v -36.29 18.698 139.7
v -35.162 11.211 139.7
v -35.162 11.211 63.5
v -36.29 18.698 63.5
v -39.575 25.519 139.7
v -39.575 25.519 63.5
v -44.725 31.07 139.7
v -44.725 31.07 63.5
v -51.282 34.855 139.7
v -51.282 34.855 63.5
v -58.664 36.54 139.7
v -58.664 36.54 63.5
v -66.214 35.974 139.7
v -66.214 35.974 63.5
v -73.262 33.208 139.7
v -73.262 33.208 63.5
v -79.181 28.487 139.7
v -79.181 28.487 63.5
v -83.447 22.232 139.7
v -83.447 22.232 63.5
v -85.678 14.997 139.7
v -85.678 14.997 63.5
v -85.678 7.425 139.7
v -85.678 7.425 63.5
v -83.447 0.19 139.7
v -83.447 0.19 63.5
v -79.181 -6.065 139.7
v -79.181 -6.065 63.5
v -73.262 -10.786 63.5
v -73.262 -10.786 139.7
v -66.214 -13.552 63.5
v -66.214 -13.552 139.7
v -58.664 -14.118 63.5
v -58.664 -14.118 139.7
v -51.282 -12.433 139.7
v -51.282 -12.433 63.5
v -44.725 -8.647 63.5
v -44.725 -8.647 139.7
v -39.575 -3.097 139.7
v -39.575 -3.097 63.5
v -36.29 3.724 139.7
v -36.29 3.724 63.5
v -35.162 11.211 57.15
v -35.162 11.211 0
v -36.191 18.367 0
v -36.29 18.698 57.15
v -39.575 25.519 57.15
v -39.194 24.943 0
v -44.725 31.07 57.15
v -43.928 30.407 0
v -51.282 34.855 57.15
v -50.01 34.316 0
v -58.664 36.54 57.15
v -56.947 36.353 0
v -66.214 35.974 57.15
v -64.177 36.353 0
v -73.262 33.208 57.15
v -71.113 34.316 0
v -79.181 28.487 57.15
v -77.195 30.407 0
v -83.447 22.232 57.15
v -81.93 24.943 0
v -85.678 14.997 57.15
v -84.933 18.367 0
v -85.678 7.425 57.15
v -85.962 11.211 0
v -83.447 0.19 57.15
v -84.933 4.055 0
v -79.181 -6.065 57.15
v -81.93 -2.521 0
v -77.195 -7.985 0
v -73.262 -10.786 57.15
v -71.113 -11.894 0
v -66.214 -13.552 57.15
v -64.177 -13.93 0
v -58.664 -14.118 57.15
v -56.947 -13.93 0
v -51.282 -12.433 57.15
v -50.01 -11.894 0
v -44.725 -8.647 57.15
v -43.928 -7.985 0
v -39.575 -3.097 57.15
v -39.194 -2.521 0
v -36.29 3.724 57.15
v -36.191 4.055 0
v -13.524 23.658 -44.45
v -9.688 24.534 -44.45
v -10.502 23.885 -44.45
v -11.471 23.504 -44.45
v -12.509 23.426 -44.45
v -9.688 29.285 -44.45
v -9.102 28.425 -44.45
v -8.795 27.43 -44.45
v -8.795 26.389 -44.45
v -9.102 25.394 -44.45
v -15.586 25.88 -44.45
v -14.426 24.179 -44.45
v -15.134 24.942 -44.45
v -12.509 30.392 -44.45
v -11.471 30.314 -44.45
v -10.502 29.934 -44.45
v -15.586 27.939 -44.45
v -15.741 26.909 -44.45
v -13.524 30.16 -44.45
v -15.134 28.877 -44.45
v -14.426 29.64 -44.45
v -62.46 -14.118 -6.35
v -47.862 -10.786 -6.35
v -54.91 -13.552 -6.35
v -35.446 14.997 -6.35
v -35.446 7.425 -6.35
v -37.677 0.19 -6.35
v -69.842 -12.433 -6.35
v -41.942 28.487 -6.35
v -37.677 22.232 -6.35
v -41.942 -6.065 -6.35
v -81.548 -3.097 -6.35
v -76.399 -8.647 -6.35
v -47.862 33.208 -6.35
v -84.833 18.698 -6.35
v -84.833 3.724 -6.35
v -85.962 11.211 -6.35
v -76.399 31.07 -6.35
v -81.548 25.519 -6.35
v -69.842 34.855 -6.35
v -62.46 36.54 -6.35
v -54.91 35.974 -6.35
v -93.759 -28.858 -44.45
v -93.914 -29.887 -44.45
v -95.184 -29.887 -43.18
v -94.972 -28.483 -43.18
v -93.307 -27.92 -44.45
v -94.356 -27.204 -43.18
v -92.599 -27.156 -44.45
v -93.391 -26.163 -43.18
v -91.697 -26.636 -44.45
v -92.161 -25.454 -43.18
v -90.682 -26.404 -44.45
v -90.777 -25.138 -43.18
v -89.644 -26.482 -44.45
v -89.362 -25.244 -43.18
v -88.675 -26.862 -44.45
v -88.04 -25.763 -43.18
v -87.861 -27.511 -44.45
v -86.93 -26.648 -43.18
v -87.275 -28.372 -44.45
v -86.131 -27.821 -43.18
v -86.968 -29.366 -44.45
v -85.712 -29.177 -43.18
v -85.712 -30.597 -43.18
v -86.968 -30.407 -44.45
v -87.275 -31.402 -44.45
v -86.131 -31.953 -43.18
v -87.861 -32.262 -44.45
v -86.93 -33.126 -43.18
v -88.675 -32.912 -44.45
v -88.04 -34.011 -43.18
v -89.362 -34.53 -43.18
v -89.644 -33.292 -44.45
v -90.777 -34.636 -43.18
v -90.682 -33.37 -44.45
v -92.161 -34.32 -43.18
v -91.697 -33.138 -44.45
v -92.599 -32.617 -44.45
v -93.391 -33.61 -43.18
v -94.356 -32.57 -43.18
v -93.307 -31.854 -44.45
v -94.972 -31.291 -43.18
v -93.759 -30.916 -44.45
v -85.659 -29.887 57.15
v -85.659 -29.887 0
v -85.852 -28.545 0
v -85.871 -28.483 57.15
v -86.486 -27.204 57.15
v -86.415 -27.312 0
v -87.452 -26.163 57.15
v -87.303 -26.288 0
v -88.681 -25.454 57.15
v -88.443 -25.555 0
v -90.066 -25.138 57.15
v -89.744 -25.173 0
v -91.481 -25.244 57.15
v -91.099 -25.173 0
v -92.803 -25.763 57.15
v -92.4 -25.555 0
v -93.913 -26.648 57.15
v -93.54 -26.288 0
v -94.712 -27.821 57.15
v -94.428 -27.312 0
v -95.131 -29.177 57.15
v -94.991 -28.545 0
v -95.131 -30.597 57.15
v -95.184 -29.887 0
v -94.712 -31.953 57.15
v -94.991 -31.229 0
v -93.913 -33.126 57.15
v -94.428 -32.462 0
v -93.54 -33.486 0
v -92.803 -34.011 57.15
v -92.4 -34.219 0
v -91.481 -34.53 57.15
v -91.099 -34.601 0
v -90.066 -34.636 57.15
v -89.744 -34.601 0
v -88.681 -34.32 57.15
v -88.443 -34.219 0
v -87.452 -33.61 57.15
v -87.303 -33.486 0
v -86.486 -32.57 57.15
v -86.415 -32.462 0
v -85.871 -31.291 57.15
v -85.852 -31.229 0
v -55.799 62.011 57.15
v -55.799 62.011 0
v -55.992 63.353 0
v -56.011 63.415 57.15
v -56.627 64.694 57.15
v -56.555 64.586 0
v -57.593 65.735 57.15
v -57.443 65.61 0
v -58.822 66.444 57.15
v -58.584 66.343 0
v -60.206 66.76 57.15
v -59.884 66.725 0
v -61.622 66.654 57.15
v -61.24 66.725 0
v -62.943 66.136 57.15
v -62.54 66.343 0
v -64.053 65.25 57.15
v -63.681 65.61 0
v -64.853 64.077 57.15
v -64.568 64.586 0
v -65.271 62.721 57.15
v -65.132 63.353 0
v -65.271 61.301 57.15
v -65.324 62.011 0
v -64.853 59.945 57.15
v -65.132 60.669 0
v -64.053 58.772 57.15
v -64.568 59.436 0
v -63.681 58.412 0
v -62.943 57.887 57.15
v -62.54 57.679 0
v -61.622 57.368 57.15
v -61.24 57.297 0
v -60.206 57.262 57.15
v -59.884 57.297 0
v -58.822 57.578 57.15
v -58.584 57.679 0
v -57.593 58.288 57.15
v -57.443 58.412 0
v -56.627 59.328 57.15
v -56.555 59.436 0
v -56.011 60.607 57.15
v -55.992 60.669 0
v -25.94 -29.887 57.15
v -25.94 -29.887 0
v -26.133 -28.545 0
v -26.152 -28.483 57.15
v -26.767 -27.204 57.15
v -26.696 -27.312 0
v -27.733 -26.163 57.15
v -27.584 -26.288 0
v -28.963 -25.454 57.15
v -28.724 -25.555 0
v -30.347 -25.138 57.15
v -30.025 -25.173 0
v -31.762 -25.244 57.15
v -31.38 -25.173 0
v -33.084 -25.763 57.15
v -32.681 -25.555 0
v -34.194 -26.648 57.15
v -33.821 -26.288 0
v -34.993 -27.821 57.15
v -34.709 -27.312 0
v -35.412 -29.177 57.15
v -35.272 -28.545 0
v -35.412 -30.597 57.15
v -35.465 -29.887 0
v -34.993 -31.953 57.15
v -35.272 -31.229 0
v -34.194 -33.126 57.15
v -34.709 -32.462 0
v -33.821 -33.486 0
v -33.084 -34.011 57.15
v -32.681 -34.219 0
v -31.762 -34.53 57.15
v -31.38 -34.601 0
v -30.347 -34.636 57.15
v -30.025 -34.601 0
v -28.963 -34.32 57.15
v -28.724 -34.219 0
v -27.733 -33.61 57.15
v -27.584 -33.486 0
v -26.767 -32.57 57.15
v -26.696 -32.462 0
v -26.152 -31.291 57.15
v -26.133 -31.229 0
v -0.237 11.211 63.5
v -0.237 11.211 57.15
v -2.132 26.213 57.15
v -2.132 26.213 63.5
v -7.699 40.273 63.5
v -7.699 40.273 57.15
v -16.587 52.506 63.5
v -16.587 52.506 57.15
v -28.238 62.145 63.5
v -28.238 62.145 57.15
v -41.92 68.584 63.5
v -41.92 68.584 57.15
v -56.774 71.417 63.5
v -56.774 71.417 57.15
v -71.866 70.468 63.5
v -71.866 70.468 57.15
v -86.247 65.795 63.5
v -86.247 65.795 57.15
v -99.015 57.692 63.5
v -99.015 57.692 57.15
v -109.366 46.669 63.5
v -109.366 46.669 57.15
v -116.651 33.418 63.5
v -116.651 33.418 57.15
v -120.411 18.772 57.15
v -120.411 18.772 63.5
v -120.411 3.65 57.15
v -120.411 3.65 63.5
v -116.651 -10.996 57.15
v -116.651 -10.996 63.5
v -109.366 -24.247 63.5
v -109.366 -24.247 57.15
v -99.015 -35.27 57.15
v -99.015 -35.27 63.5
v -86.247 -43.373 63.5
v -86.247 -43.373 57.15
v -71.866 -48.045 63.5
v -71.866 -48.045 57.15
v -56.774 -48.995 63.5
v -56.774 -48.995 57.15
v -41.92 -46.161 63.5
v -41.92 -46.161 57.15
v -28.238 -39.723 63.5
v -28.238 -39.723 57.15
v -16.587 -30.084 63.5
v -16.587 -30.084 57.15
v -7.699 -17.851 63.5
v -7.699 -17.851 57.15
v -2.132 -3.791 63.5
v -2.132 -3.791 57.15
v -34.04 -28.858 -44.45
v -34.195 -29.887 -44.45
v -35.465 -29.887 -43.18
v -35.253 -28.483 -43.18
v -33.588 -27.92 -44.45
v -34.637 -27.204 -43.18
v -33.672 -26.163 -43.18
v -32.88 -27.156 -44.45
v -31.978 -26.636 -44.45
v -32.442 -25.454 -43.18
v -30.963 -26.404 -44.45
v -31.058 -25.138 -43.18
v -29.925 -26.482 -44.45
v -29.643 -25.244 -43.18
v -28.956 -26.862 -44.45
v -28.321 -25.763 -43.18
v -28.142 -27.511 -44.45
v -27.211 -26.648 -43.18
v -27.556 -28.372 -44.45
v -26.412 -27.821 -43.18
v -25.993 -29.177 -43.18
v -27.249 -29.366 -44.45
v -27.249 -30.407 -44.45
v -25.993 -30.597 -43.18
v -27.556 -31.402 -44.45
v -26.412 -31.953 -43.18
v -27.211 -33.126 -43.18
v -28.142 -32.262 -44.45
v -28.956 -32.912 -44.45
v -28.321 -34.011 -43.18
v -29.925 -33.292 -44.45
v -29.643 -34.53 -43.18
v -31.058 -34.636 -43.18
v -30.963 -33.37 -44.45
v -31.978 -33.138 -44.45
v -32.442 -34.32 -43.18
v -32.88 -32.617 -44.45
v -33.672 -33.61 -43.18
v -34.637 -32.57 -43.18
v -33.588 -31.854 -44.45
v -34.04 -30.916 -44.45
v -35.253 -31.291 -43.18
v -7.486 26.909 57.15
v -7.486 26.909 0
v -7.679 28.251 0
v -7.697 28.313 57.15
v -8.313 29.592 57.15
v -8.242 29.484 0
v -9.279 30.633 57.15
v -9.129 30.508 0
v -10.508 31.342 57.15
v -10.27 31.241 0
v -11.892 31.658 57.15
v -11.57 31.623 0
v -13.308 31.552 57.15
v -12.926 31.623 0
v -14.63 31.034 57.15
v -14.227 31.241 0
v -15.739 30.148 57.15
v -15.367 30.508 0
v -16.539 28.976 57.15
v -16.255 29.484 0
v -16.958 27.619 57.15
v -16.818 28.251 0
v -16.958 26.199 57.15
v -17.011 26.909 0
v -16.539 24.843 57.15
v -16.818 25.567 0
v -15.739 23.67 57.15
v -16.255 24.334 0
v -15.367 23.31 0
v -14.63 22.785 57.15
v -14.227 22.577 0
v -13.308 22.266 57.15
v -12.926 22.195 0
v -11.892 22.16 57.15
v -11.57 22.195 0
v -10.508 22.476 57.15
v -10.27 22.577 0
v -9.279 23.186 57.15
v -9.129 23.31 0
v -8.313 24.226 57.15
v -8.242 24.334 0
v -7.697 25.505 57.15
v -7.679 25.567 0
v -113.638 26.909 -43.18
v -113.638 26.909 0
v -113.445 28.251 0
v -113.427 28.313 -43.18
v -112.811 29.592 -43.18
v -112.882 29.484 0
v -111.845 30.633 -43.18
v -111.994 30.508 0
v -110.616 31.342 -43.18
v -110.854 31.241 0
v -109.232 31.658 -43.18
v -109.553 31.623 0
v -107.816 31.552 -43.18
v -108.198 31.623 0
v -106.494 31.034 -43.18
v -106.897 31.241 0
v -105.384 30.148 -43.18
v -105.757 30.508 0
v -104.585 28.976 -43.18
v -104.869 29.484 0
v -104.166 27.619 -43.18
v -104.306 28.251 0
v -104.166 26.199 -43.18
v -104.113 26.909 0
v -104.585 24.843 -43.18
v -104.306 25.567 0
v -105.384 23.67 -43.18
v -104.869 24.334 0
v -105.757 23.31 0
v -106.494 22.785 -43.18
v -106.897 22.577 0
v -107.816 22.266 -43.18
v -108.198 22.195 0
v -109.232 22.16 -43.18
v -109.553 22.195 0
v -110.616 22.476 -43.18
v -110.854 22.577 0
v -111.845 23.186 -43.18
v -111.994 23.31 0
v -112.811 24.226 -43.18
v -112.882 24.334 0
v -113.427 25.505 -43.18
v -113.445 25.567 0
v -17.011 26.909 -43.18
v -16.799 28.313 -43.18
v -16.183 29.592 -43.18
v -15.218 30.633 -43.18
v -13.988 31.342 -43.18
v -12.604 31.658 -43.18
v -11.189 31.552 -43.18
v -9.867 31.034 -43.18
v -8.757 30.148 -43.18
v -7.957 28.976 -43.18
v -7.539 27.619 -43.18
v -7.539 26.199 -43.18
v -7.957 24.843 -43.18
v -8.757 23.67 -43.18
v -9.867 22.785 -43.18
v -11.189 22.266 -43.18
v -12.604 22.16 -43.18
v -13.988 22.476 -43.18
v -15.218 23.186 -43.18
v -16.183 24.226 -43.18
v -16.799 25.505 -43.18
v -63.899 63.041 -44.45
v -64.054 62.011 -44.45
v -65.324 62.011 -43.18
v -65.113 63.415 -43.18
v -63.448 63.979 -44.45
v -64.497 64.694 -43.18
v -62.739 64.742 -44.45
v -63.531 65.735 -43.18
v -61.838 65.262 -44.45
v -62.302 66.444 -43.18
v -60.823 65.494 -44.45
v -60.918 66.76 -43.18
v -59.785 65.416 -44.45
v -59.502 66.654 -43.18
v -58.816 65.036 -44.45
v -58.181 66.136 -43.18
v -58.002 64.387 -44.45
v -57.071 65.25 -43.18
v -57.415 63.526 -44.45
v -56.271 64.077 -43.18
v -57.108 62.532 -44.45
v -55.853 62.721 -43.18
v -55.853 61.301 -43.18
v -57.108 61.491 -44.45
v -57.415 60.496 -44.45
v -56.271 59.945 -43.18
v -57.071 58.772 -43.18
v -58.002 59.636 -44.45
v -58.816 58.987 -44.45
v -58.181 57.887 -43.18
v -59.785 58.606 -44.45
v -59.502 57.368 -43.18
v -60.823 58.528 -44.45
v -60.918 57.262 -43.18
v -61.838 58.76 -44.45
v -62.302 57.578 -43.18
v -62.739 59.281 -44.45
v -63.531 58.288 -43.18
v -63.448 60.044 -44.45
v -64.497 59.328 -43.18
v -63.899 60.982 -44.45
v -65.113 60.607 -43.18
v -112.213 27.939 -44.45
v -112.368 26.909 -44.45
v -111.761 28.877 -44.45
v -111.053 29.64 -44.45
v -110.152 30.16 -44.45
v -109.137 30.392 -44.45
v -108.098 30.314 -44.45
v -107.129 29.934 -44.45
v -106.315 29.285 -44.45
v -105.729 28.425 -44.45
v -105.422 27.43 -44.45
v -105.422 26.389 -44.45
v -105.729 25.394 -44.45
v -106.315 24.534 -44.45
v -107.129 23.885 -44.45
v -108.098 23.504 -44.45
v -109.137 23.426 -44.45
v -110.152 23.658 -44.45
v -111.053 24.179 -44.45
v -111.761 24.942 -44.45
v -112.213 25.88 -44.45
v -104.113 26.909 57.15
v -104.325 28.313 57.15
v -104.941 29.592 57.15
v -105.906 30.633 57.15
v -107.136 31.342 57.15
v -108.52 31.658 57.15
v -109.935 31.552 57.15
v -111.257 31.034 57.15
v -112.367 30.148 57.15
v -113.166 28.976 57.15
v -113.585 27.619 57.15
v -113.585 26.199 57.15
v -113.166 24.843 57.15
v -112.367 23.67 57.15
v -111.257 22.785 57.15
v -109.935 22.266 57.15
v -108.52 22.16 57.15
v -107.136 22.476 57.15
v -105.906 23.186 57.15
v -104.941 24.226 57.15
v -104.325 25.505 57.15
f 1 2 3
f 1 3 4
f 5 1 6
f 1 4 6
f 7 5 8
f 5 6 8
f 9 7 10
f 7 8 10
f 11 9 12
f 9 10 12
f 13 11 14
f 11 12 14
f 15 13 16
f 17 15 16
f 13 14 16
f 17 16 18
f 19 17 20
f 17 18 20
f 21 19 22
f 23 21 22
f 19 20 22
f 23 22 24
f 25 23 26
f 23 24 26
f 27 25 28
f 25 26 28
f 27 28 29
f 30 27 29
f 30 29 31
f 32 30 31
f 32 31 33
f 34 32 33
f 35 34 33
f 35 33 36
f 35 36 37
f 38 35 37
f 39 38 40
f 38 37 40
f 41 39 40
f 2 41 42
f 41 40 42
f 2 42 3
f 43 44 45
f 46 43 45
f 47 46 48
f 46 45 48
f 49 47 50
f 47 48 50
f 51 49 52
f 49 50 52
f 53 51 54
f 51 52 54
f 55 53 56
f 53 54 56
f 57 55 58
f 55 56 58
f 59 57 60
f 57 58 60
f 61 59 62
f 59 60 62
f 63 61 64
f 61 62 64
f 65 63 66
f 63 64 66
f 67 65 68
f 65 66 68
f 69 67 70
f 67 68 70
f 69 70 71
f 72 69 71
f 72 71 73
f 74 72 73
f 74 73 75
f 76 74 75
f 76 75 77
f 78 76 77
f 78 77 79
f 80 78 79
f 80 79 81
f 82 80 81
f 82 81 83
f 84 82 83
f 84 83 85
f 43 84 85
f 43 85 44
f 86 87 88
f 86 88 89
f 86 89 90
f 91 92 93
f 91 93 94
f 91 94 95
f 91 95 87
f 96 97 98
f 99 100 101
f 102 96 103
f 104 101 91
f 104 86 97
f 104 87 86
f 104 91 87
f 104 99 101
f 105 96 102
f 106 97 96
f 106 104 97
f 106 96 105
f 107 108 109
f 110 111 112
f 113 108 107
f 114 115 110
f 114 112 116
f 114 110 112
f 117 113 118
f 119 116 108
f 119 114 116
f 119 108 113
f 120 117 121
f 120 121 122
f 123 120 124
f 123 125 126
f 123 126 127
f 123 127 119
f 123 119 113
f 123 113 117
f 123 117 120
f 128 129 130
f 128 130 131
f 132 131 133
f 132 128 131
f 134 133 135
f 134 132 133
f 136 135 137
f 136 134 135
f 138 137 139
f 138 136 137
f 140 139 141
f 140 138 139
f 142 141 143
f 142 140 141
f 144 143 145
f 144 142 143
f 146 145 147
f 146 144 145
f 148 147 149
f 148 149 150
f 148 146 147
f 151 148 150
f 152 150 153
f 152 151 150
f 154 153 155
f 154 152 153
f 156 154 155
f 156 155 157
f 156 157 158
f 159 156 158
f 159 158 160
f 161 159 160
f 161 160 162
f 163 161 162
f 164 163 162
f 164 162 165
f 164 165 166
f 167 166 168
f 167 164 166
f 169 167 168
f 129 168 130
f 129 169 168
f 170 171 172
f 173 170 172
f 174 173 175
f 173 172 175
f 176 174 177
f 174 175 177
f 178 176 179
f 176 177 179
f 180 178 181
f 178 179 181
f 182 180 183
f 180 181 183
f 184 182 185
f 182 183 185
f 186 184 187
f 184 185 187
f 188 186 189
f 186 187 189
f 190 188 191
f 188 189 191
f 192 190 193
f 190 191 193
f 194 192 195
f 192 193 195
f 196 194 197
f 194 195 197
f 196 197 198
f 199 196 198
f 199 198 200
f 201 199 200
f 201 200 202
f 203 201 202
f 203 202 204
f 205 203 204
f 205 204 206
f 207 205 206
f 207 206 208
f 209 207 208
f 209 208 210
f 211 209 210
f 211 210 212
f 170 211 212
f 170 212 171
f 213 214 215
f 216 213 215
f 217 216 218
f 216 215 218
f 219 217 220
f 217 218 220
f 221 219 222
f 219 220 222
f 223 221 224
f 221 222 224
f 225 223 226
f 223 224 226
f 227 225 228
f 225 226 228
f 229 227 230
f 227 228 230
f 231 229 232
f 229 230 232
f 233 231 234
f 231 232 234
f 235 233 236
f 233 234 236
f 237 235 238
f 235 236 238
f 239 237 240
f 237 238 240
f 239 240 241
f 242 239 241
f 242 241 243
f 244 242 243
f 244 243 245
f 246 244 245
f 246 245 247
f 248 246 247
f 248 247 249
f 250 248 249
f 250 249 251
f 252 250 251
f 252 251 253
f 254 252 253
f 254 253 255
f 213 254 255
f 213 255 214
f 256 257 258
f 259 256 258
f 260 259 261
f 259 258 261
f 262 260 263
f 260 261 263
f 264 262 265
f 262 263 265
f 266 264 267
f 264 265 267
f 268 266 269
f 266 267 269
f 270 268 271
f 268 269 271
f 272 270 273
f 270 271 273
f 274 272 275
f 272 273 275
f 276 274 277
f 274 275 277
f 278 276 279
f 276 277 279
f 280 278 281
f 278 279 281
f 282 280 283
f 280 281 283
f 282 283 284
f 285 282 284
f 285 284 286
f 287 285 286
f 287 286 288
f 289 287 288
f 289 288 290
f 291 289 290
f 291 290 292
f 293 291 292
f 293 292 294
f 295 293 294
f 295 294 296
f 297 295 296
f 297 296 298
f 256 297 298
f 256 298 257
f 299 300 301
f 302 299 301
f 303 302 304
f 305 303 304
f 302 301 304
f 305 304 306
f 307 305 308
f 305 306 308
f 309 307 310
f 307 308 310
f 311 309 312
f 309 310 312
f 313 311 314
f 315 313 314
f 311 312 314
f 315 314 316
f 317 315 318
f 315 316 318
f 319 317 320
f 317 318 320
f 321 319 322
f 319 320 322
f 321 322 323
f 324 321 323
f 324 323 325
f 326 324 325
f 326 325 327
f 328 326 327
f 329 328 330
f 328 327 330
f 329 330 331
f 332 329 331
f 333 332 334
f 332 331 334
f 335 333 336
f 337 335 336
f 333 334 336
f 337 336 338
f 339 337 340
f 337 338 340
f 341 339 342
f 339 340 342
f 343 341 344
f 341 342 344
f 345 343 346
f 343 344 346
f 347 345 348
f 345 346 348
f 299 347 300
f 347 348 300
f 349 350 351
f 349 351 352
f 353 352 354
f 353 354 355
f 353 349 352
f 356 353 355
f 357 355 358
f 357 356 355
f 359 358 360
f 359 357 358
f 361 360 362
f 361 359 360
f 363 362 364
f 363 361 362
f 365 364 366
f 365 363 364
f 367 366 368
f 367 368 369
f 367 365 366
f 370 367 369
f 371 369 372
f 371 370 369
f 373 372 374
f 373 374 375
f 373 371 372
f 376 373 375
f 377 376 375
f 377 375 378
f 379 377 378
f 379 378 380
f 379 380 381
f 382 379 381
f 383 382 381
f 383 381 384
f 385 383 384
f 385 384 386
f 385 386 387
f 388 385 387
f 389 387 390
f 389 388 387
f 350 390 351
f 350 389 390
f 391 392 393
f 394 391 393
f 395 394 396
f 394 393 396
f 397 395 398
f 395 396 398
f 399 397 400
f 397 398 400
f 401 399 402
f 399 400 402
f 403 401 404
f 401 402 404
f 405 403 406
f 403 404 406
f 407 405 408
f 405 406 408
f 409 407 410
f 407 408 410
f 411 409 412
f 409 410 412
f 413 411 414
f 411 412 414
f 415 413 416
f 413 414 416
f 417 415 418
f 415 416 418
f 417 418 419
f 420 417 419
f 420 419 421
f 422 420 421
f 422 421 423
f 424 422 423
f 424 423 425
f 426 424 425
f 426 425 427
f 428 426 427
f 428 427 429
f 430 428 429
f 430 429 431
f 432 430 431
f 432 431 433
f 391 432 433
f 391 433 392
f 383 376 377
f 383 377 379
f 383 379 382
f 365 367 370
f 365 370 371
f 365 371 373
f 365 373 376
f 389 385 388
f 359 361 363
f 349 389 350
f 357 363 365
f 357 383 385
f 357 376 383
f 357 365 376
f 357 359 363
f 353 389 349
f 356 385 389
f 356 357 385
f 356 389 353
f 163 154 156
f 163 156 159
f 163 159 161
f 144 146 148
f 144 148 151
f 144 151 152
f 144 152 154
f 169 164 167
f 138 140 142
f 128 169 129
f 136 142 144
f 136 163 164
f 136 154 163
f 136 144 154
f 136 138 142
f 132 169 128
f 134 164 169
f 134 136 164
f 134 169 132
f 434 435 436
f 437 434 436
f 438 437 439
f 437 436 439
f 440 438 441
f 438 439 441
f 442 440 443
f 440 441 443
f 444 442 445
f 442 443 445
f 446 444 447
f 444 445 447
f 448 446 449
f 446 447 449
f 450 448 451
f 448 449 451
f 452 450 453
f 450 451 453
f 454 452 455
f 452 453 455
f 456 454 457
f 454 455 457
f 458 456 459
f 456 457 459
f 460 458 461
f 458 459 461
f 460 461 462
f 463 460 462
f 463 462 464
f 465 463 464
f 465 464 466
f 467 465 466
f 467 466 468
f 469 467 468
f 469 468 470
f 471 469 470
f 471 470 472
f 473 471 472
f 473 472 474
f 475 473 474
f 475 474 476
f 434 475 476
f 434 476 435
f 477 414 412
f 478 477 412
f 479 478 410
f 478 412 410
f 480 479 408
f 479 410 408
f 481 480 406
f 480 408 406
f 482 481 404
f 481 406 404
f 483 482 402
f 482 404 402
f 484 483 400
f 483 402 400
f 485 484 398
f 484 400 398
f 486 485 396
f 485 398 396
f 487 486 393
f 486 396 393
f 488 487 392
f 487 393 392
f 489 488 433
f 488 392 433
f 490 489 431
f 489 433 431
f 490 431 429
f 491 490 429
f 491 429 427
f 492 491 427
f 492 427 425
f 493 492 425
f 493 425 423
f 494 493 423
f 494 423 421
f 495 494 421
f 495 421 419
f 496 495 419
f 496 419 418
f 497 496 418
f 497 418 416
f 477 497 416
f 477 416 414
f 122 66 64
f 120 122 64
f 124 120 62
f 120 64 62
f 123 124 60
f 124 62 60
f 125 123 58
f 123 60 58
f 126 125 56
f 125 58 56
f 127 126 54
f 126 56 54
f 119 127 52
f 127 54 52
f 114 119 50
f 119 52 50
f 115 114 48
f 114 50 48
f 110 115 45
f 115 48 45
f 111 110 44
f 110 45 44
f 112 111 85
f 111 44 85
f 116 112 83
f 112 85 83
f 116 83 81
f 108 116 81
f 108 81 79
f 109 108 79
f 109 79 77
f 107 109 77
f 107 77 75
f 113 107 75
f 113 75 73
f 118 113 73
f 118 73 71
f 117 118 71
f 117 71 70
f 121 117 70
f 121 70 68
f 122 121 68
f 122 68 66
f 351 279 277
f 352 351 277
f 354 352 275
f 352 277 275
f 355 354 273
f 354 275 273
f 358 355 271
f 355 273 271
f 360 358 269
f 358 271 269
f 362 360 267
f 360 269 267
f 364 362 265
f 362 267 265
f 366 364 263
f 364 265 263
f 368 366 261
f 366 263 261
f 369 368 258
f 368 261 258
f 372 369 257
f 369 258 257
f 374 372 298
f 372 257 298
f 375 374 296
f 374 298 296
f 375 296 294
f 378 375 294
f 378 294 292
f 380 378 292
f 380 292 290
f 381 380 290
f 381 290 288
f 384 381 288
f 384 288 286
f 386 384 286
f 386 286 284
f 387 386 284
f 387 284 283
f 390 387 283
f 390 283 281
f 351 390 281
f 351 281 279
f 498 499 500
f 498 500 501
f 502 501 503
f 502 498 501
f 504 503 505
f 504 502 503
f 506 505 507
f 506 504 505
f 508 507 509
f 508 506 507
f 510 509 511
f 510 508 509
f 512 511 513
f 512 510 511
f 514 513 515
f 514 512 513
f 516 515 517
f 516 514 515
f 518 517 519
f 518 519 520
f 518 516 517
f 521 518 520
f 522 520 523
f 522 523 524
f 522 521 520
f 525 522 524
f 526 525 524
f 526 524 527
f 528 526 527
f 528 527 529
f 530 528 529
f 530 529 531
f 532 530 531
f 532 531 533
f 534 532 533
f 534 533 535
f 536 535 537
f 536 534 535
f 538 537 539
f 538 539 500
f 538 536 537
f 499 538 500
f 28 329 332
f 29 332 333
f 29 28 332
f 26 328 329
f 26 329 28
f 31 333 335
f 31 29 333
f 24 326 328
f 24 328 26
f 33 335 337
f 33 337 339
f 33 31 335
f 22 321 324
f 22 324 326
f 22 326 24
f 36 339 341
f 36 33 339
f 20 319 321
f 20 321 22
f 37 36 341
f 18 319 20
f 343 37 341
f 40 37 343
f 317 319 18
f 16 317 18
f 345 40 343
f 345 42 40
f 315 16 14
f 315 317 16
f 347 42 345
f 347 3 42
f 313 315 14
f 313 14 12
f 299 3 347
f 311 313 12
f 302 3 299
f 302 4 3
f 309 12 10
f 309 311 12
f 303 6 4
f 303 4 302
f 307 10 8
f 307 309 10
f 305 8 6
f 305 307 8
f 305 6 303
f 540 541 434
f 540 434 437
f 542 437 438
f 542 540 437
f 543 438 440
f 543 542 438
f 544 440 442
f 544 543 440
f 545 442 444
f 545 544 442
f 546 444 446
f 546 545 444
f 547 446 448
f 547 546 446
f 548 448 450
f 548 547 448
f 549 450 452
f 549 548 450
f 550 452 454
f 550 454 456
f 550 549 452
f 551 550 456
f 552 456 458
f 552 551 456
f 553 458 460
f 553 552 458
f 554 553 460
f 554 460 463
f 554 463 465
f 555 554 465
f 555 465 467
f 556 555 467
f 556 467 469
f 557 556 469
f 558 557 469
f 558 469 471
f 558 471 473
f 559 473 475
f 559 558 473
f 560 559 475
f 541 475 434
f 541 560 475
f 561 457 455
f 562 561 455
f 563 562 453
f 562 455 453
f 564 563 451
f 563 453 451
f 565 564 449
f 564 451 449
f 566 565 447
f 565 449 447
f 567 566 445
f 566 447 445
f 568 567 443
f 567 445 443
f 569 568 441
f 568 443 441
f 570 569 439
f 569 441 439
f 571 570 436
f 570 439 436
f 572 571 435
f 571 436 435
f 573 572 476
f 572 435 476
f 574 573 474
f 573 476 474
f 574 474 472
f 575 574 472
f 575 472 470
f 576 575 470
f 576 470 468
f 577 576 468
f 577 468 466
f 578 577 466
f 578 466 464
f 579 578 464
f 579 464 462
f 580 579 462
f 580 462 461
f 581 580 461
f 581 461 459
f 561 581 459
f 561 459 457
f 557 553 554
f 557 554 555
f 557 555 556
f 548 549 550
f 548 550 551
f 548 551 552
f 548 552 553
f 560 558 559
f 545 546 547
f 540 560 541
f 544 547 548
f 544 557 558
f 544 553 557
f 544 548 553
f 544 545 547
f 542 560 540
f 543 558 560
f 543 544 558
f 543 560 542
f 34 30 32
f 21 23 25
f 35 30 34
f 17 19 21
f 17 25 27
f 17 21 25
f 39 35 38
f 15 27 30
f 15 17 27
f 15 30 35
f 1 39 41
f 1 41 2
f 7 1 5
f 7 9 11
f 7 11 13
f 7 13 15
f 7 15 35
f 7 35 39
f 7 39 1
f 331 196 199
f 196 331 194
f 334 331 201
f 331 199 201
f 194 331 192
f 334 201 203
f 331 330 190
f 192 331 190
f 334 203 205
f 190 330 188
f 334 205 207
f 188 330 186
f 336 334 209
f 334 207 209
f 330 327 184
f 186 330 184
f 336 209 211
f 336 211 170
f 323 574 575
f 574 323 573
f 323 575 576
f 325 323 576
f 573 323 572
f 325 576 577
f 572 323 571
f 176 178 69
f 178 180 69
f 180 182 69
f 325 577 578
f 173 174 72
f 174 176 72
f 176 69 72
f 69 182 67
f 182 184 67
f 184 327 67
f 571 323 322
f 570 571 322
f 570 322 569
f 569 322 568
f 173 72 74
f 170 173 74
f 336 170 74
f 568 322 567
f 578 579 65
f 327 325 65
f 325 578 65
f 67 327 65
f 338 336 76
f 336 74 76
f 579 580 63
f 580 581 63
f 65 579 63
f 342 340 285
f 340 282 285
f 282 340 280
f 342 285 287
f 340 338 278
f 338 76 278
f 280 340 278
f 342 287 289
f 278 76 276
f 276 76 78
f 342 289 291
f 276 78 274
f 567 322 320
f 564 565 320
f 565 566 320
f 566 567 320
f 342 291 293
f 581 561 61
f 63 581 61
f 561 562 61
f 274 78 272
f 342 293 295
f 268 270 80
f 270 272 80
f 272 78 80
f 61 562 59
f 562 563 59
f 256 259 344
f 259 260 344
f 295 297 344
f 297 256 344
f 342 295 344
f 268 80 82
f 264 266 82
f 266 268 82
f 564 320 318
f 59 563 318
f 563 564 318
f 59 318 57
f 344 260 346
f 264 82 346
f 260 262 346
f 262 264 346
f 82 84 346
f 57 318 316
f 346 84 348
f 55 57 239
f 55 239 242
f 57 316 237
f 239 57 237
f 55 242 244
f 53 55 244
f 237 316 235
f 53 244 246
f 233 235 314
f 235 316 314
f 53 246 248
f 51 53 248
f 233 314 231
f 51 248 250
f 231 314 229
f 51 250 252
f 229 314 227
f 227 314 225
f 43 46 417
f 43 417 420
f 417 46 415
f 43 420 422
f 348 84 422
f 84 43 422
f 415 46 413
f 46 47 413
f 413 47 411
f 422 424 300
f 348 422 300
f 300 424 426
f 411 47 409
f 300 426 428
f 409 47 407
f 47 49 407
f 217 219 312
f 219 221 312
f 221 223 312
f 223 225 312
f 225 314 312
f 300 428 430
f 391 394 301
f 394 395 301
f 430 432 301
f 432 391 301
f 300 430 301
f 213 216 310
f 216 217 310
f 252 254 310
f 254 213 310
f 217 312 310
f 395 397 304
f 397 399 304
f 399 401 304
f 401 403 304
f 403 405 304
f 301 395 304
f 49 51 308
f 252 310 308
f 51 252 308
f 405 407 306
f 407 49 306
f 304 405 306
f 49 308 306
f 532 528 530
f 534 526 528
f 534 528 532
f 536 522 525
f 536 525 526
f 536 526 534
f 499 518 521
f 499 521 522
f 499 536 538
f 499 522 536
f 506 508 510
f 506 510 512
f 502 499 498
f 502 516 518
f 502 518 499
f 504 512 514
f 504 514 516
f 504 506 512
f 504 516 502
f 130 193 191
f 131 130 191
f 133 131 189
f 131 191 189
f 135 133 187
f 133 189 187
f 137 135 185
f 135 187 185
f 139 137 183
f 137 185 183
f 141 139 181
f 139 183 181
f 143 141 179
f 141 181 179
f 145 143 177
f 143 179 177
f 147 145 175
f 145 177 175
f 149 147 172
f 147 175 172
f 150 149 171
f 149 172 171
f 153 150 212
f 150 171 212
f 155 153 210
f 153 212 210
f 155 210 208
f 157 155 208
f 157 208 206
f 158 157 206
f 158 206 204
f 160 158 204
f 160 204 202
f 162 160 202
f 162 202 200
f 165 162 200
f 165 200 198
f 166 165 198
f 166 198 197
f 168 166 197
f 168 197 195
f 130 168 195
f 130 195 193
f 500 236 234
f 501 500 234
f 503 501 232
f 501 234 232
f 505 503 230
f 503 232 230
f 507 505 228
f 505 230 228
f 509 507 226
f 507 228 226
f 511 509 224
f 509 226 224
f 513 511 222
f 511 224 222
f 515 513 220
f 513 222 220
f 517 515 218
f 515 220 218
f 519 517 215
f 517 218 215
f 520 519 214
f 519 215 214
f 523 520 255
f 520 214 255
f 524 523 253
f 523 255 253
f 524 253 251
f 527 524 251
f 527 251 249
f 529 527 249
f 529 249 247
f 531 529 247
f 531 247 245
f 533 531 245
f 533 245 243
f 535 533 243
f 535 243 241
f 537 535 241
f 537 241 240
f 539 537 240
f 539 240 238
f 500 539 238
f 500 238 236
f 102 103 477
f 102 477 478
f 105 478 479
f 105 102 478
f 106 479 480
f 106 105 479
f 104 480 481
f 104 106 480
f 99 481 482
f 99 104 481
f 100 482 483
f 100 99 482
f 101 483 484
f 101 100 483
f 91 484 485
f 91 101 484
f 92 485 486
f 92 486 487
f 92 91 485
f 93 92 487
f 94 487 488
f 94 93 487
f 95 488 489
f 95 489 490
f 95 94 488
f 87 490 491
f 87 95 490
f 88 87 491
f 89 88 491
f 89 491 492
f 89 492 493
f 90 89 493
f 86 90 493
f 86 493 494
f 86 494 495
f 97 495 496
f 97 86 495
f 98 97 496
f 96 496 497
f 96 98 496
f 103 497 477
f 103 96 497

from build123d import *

# Parameters (mm, degrees)
SKETCH2_R             = 25.4
BOSS_EXTRUDE1_DEPTH   = 57.15
SKETCH2_R_2           = 4.7625
BOSS_EXTRUDE1_2_DEPTH = 57.15
BOSS_EXTRUDE1_3_DEPTH = 57.15
BOSS_EXTRUDE1_4_DEPTH = 57.15
BOSS_EXTRUDE1_5_DEPTH = 57.15
BOSS_EXTRUDE1_6_DEPTH = 57.15
SKETCH3_R             = 60.325
BOSS_EXTRUDE2_DEPTH   = 6.35
SKETCH4_R             = 25.4
BOSS_EXTRUDE3_DEPTH   = 6.35
SKETCH5_R             = 4.7625
BOSS_EXTRUDE4_DEPTH   = 44.45
CHAMFER1_SIZE         = 1.27
SKETCH7_R             = 25.4
BOSS_EXTRUDE5_DEPTH   = 76.2


with BuildPart() as part:
    # Sketch2 → Boss-Extrude1 (new body)
    with BuildSketch(Plane.XY):
        with Locations((-60.561942489, 11.211112057)):
            Circle(SKETCH2_R)
    extrude(amount=BOSS_EXTRUDE1_DEPTH)



with BuildPart() as body_2:
    # Sketch2 → Boss-Extrude1 2 (new body)
    with BuildSketch(Plane.XY):
        with Locations((-12.248271462, 26.909175371)):
            Circle(SKETCH2_R_2)
    extrude(amount=BOSS_EXTRUDE1_2_DEPTH)


with BuildPart() as body_3:
    # Sketch2 → Boss-Extrude1 3 (new body)
    with BuildSketch(Plane.XY):
        with Locations((-60.561942489, 62.011112057)):
            Circle(SKETCH2_R_2)
    extrude(amount=BOSS_EXTRUDE1_3_DEPTH)


with BuildPart() as body_4:
    # Sketch2 → Boss-Extrude1 4 (new body)
    with BuildSketch(Plane.XY):
        with Locations((-108.875613517, 26.909175371)):
            Circle(SKETCH2_R_2)
    extrude(amount=BOSS_EXTRUDE1_4_DEPTH)


with BuildPart() as body_5:
    # Sketch2 → Boss-Extrude1 5 (new body)
    with BuildSketch(Plane.XY):
        with Locations((-90.421433306, -29.886951258)):
            Circle(SKETCH2_R_2)
    extrude(amount=BOSS_EXTRUDE1_5_DEPTH)


with BuildPart() as body_6:
    # Sketch2 → Boss-Extrude1 6 (new body)
    with BuildSketch(Plane.XY):
        with Locations((-30.702451673, -29.886951258)):
            Circle(SKETCH2_R_2)
    extrude(amount=BOSS_EXTRUDE1_6_DEPTH)


with BuildPart() as part_1:
    add(part.part)

    add(body_2.part)  # Boss-Extrude2 merges body 2

    add(body_3.part)  # Boss-Extrude2 merges body 3

    add(body_4.part)  # Boss-Extrude2 merges body 4

    add(body_5.part)  # Boss-Extrude2 merges body 5

    add(body_6.part)  # Boss-Extrude2 merges body 6
    # Sketch3 → Boss-Extrude2 (add)
    with BuildSketch(Plane.XY.offset(57.15)):
        with Locations((-60.561942489, 11.211112057)):
            Circle(SKETCH3_R)
    extrude(amount=BOSS_EXTRUDE2_DEPTH)

    # Sketch4 → Boss-Extrude3 (add)
    with BuildSketch(Plane(origin=(0, 0, 0), x_dir=(-1, 0, 0), z_dir=(0, 0, -1))):
        with Locations((60.561942489, 11.211112057)):
            Circle(SKETCH4_R)
    extrude(amount=BOSS_EXTRUDE3_DEPTH)

    # Sketch5 → Boss-Extrude4 (add)
    with BuildSketch(Plane(origin=(0, 0, 0), x_dir=(-1, 0, 0), z_dir=(0, 0, -1))):
        with Locations((12.248271462, 26.909175371)):
            Circle(SKETCH5_R)
        with Locations((30.702451673, -29.886951258)):
            Circle(SKETCH5_R)
        with Locations((90.421433306, -29.886951258)):
            Circle(SKETCH5_R)
        with Locations((108.875613517, 26.909175371)):
            Circle(SKETCH5_R)
        with Locations((60.561942489, 62.011112057)):
            Circle(SKETCH5_R)
    extrude(amount=BOSS_EXTRUDE4_DEPTH)

    # Chamfer1
    chamfer1_edges = [part_1.edges().sort_by_distance(p)[0] for p in [
        (-7.485771462, 26.909175371, -44.45),
        (-25.939951673, -29.886951258, -44.45),
        (-85.658933306, -29.886951258, -44.45),
        (-104.113113517, 26.909175371, -44.45),
        (-55.799442489, 62.011112057, -44.45),
    ]]
    chamfer(chamfer1_edges, length=CHAMFER1_SIZE)

    # Sketch7 → Boss-Extrude5 (add)
    with BuildSketch(Plane.XY.offset(63.5)):
        with Locations((-60.561942489, 11.211112057)):
            Circle(SKETCH7_R)
    extrude(amount=BOSS_EXTRUDE5_DEPTH)


solid = part_1.part
